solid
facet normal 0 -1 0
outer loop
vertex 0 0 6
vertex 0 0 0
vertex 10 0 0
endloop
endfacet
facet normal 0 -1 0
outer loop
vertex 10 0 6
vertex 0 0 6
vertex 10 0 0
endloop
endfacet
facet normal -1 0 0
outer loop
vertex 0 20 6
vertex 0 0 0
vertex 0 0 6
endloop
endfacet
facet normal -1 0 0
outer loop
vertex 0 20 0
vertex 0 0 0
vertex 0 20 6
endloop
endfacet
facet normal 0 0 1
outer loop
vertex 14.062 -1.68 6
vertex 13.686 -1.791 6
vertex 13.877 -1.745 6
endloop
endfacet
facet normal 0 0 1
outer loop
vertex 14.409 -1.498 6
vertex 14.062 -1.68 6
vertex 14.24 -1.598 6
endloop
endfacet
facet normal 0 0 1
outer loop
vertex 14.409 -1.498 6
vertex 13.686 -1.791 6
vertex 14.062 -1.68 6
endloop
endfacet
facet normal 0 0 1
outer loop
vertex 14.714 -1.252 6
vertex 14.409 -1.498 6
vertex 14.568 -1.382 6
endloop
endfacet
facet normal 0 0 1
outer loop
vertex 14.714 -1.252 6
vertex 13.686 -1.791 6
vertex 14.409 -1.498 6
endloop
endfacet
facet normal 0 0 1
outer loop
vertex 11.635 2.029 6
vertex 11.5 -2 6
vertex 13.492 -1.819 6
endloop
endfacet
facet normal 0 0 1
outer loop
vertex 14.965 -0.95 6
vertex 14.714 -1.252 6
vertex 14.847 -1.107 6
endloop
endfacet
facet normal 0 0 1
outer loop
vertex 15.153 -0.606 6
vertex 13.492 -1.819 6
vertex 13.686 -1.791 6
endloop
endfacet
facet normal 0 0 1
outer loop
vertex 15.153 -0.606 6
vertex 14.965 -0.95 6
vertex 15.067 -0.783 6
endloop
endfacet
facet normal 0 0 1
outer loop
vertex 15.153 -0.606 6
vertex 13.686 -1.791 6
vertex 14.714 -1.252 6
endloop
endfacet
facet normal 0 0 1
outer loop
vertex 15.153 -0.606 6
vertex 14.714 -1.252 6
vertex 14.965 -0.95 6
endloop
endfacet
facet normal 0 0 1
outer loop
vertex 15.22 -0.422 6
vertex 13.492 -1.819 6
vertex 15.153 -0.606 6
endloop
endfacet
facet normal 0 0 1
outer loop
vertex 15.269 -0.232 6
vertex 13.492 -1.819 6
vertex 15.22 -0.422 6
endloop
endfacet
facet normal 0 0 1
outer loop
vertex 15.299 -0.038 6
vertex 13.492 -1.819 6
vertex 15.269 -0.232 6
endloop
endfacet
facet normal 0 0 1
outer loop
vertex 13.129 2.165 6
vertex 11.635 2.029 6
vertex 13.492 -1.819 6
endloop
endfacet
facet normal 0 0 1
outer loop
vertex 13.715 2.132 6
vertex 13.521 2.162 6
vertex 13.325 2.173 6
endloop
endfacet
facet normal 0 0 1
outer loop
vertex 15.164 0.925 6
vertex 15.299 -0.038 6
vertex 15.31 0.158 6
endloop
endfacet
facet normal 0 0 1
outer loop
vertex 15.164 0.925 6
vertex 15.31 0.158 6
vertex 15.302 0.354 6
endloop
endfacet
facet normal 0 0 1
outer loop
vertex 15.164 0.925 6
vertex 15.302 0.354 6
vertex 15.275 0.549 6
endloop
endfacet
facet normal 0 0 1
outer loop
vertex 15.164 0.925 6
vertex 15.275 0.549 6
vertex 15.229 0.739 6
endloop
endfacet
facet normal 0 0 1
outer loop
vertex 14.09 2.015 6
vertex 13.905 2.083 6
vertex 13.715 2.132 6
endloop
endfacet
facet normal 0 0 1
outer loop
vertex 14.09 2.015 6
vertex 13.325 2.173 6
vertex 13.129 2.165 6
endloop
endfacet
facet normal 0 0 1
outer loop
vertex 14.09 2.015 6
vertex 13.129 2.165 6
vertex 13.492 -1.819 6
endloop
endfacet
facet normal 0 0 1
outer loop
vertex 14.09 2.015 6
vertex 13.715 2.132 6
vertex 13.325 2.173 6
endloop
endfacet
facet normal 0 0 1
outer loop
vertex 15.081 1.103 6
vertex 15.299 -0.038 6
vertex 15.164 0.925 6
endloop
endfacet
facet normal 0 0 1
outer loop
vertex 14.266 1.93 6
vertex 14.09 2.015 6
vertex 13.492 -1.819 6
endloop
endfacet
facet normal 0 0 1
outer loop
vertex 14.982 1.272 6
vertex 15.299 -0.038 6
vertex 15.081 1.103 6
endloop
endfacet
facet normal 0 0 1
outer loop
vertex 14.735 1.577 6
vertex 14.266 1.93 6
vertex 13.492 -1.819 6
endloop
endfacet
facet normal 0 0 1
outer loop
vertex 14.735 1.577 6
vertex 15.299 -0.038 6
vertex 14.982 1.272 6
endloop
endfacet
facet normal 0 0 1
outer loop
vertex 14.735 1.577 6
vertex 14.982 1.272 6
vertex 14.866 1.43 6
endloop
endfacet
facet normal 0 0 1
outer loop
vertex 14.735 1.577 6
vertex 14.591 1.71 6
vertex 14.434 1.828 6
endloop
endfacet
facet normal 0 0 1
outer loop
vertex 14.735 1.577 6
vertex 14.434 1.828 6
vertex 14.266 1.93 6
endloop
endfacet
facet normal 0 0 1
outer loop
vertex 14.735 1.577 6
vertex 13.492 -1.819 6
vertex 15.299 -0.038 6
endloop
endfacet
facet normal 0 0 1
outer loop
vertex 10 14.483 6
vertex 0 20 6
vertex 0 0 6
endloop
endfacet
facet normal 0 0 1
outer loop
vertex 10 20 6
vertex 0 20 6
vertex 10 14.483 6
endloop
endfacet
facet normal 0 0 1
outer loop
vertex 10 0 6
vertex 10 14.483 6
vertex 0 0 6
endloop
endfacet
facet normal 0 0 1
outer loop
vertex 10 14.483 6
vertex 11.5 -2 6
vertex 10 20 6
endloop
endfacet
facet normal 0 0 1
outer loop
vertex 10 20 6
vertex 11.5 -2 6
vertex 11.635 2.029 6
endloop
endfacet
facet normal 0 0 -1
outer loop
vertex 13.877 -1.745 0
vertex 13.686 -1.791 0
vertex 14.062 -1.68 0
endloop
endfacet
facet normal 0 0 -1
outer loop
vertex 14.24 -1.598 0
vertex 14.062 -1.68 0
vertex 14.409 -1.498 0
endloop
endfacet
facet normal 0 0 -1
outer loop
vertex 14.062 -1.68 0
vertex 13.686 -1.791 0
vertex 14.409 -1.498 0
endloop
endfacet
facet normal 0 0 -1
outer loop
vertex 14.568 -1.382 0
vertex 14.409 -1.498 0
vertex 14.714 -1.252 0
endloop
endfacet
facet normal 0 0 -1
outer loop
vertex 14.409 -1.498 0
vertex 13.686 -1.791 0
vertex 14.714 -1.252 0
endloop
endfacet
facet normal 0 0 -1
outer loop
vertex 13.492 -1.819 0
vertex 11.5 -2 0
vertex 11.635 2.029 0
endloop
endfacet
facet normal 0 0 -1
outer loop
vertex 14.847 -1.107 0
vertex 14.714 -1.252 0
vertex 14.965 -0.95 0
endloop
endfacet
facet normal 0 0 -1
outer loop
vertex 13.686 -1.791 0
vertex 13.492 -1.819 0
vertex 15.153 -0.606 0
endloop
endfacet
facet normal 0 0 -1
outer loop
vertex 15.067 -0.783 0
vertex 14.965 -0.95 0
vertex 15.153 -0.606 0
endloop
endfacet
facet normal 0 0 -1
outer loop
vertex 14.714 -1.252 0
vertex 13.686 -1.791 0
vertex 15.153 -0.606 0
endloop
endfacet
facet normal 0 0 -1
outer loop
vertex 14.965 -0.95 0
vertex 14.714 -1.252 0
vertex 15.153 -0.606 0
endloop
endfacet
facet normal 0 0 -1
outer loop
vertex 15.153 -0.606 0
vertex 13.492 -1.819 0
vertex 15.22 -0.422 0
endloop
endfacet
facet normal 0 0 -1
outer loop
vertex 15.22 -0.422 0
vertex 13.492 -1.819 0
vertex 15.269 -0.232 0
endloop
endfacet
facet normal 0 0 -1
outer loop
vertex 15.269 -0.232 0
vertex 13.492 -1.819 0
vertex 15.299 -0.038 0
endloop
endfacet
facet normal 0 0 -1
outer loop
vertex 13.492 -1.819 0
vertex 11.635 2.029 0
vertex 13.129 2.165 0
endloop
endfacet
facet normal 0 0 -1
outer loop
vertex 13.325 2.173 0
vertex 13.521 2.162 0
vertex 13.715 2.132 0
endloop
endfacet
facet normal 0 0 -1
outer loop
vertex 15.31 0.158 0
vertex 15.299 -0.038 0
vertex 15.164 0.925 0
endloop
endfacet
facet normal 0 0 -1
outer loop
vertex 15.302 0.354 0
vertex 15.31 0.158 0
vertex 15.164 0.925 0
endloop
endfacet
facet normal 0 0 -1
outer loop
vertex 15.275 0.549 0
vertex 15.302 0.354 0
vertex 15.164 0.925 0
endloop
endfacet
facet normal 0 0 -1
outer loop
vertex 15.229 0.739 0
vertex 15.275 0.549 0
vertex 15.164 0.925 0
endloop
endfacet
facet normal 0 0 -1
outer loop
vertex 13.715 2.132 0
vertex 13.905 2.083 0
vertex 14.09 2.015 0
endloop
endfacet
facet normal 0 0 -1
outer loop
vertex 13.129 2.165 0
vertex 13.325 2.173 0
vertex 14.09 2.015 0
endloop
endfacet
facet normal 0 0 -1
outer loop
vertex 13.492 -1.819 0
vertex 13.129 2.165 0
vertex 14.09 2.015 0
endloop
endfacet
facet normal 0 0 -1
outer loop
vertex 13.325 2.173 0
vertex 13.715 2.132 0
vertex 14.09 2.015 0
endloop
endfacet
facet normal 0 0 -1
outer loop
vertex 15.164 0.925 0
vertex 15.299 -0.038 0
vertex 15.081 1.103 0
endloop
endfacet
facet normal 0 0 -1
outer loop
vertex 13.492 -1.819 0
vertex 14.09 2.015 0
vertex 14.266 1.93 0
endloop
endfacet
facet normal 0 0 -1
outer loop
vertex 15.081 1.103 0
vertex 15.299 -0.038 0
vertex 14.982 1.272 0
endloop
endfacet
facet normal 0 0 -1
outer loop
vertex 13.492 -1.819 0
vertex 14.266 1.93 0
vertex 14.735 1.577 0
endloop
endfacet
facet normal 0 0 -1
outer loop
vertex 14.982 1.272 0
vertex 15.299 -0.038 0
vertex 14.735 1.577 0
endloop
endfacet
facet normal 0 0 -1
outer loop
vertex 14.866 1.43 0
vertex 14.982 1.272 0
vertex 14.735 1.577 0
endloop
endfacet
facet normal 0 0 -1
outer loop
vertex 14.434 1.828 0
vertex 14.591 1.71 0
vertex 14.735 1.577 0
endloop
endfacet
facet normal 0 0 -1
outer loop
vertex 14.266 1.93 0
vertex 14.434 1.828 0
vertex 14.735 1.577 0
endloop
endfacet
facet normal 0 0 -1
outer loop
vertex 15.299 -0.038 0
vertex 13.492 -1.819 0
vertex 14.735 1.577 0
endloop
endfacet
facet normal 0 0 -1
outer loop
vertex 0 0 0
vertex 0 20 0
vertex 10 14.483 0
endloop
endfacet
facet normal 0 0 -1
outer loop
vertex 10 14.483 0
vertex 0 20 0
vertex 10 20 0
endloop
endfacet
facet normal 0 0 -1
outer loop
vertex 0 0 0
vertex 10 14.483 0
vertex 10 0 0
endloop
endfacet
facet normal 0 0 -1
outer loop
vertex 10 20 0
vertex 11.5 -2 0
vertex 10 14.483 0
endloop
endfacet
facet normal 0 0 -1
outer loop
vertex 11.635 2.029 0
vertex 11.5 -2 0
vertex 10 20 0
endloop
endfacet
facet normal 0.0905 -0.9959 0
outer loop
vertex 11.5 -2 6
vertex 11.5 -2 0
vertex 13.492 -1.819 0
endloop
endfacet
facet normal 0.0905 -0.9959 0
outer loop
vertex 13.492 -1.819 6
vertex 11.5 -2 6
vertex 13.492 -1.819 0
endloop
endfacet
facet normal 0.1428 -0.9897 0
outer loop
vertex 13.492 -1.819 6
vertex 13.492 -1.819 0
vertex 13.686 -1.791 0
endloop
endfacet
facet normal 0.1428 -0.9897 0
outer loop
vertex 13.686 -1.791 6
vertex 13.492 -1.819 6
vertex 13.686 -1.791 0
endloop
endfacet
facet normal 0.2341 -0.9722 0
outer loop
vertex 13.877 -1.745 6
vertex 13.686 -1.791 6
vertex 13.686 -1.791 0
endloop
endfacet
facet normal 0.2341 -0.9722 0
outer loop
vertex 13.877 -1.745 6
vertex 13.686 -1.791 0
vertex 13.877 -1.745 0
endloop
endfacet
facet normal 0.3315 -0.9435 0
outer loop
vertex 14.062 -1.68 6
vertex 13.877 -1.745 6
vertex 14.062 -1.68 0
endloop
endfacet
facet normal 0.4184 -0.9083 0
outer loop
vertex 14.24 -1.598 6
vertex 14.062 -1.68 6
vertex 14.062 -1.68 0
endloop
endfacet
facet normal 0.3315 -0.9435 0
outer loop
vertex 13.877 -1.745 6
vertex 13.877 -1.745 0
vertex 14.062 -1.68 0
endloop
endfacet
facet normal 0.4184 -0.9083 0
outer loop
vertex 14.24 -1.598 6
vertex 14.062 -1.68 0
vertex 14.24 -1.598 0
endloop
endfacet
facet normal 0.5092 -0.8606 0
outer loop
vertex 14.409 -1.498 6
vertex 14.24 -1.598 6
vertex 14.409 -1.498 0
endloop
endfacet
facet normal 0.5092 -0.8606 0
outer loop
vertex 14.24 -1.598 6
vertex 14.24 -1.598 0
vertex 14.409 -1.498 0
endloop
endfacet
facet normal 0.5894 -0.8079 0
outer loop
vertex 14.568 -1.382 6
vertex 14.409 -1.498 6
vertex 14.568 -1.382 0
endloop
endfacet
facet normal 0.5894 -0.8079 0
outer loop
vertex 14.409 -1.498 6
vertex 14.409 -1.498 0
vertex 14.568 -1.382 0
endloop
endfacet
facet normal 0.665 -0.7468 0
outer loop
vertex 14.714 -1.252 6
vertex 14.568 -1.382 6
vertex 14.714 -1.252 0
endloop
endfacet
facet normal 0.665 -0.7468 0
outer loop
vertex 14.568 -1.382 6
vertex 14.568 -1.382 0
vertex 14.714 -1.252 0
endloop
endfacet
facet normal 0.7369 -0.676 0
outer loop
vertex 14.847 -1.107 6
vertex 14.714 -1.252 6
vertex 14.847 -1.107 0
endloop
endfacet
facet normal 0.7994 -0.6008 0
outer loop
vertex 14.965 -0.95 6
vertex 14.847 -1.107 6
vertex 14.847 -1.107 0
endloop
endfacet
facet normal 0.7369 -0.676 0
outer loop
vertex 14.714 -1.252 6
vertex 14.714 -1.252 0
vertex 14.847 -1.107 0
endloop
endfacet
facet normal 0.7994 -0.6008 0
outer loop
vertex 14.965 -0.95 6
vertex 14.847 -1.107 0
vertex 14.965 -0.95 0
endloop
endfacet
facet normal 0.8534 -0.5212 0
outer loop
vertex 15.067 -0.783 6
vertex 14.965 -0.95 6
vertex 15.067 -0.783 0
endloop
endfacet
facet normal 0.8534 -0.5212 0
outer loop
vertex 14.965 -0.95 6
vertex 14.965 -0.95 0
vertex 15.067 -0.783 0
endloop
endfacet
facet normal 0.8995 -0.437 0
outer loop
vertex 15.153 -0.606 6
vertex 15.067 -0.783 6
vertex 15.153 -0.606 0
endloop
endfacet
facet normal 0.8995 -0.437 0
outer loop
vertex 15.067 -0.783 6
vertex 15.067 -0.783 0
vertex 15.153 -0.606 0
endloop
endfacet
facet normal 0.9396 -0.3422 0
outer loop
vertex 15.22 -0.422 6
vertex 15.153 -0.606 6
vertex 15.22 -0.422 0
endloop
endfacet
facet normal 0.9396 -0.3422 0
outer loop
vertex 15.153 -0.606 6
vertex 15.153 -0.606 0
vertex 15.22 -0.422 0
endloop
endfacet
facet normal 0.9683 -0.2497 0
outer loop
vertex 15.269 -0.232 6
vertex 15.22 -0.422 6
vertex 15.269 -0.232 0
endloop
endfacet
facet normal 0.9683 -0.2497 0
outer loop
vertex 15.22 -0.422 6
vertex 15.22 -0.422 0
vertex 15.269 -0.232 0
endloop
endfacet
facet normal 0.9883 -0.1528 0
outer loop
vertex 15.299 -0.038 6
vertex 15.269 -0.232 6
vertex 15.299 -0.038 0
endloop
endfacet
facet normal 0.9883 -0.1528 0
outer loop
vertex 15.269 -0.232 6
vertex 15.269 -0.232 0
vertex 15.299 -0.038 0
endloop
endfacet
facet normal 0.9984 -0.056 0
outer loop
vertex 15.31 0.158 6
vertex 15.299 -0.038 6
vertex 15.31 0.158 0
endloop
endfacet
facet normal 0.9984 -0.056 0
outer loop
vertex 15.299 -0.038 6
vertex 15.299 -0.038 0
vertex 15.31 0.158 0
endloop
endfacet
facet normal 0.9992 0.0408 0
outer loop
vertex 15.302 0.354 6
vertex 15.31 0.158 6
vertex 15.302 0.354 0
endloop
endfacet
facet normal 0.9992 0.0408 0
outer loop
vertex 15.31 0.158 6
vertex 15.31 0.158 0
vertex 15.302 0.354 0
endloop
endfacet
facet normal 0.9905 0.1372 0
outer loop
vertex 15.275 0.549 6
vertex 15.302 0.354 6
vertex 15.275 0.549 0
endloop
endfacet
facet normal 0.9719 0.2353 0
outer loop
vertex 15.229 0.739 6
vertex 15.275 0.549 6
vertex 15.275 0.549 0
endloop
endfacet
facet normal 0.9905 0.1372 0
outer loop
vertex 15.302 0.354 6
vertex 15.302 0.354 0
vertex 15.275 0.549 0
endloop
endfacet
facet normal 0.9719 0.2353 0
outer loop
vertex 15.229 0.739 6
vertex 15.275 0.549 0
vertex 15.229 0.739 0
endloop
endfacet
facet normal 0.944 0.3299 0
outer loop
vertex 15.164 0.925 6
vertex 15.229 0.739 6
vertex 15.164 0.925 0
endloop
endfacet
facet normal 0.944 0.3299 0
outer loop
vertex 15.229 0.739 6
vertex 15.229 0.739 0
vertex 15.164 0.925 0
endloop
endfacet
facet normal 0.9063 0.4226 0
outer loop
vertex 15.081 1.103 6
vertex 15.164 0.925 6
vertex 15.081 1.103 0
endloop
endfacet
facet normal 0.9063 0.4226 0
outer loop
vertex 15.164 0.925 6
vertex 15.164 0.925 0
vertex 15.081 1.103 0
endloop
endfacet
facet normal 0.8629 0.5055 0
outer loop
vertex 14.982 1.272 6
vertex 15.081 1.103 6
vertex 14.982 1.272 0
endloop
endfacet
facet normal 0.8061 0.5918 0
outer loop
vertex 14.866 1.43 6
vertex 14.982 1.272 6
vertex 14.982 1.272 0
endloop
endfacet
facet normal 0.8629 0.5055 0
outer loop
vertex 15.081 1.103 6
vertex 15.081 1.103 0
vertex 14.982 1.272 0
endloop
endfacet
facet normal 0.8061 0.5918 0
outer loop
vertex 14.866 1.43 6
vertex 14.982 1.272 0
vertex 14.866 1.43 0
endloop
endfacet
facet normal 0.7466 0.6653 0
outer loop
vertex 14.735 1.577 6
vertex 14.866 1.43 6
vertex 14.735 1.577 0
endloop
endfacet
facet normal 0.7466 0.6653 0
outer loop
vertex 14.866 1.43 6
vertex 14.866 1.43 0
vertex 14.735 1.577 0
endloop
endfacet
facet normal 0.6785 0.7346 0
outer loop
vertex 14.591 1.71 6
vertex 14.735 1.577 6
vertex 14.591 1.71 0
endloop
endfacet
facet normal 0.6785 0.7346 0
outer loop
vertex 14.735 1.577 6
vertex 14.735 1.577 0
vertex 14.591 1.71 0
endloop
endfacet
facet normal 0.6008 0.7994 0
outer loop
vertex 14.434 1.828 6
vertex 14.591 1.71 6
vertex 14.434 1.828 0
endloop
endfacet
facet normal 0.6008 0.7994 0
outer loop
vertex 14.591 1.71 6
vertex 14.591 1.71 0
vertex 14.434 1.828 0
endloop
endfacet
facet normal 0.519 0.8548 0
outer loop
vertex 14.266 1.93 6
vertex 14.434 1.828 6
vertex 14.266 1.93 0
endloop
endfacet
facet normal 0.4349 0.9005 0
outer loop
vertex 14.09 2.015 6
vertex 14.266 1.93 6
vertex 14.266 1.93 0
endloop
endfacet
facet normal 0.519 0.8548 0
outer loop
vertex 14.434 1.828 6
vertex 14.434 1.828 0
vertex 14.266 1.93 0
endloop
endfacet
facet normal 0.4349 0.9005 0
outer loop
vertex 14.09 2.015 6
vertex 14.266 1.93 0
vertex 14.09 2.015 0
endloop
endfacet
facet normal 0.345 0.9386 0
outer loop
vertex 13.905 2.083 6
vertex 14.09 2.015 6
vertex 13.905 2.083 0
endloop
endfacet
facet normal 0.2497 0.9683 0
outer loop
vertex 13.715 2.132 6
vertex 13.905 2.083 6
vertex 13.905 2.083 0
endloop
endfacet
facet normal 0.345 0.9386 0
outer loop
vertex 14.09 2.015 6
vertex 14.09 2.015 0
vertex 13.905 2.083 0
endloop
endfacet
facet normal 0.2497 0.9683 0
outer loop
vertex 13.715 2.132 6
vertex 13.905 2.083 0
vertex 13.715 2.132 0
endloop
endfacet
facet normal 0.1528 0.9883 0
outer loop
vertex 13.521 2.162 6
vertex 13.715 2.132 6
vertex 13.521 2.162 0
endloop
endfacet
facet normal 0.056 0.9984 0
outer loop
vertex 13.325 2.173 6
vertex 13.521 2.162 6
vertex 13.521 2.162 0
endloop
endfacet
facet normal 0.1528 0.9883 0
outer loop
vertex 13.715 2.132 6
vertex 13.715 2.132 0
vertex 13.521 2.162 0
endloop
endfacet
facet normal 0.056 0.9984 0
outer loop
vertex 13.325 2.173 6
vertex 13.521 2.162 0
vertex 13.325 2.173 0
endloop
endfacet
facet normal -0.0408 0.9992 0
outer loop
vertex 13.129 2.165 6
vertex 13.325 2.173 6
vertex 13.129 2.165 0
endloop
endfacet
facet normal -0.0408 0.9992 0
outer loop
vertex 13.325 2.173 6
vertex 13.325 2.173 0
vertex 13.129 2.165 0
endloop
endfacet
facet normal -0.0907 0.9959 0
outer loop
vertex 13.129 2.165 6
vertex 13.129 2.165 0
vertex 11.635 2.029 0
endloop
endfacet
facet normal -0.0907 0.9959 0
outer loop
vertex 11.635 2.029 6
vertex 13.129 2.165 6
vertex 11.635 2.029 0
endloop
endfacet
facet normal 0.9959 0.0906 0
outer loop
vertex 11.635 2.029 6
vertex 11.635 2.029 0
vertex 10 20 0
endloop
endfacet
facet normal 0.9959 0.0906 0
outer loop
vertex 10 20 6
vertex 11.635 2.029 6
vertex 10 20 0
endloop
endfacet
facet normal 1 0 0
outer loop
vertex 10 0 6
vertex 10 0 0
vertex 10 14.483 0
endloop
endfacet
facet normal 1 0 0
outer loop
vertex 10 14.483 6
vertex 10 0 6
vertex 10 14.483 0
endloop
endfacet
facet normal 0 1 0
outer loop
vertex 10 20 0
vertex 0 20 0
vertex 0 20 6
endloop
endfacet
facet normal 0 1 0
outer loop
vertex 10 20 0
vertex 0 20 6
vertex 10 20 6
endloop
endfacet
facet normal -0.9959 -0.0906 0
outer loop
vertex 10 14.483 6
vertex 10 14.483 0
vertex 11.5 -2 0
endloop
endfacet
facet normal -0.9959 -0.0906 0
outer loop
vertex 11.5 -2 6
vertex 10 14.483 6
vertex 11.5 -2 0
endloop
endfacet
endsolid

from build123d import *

# Parameters (mm, degrees)
SZKIC1_W                    = 10
SZKIC1_H                    = 20
DODANIE_WYCI_GNI_CIE1_DEPTH = 6


with BuildPart() as part:
    # Szkic1 → Dodanie-wyciągnięcie1 (new body)
    with BuildSketch(Plane.XY):
        with Locations((5, 10)):
            Rectangle(SZKIC1_W, SZKIC1_H)
        with BuildLine():
            Line((10, 20), (10, 14.482972118))
            Line((10, 14.482972118), (11.5, -2))
            Line((11.5, -2), (13.491769539, -1.818742986))
            ThreePointArc((13.491769539, -1.818742986), (15.302282063, 0.354283567), (13.129255511, 2.164796091))
            Line((13.129255511, 2.164796091), (11.635428357, 2.028853331))
            Line((11.635428357, 2.028853331), (10, 20))
        make_face()
    extrude(amount=DODANIE_WYCI_GNI_CIE1_DEPTH)


solid = part.part
